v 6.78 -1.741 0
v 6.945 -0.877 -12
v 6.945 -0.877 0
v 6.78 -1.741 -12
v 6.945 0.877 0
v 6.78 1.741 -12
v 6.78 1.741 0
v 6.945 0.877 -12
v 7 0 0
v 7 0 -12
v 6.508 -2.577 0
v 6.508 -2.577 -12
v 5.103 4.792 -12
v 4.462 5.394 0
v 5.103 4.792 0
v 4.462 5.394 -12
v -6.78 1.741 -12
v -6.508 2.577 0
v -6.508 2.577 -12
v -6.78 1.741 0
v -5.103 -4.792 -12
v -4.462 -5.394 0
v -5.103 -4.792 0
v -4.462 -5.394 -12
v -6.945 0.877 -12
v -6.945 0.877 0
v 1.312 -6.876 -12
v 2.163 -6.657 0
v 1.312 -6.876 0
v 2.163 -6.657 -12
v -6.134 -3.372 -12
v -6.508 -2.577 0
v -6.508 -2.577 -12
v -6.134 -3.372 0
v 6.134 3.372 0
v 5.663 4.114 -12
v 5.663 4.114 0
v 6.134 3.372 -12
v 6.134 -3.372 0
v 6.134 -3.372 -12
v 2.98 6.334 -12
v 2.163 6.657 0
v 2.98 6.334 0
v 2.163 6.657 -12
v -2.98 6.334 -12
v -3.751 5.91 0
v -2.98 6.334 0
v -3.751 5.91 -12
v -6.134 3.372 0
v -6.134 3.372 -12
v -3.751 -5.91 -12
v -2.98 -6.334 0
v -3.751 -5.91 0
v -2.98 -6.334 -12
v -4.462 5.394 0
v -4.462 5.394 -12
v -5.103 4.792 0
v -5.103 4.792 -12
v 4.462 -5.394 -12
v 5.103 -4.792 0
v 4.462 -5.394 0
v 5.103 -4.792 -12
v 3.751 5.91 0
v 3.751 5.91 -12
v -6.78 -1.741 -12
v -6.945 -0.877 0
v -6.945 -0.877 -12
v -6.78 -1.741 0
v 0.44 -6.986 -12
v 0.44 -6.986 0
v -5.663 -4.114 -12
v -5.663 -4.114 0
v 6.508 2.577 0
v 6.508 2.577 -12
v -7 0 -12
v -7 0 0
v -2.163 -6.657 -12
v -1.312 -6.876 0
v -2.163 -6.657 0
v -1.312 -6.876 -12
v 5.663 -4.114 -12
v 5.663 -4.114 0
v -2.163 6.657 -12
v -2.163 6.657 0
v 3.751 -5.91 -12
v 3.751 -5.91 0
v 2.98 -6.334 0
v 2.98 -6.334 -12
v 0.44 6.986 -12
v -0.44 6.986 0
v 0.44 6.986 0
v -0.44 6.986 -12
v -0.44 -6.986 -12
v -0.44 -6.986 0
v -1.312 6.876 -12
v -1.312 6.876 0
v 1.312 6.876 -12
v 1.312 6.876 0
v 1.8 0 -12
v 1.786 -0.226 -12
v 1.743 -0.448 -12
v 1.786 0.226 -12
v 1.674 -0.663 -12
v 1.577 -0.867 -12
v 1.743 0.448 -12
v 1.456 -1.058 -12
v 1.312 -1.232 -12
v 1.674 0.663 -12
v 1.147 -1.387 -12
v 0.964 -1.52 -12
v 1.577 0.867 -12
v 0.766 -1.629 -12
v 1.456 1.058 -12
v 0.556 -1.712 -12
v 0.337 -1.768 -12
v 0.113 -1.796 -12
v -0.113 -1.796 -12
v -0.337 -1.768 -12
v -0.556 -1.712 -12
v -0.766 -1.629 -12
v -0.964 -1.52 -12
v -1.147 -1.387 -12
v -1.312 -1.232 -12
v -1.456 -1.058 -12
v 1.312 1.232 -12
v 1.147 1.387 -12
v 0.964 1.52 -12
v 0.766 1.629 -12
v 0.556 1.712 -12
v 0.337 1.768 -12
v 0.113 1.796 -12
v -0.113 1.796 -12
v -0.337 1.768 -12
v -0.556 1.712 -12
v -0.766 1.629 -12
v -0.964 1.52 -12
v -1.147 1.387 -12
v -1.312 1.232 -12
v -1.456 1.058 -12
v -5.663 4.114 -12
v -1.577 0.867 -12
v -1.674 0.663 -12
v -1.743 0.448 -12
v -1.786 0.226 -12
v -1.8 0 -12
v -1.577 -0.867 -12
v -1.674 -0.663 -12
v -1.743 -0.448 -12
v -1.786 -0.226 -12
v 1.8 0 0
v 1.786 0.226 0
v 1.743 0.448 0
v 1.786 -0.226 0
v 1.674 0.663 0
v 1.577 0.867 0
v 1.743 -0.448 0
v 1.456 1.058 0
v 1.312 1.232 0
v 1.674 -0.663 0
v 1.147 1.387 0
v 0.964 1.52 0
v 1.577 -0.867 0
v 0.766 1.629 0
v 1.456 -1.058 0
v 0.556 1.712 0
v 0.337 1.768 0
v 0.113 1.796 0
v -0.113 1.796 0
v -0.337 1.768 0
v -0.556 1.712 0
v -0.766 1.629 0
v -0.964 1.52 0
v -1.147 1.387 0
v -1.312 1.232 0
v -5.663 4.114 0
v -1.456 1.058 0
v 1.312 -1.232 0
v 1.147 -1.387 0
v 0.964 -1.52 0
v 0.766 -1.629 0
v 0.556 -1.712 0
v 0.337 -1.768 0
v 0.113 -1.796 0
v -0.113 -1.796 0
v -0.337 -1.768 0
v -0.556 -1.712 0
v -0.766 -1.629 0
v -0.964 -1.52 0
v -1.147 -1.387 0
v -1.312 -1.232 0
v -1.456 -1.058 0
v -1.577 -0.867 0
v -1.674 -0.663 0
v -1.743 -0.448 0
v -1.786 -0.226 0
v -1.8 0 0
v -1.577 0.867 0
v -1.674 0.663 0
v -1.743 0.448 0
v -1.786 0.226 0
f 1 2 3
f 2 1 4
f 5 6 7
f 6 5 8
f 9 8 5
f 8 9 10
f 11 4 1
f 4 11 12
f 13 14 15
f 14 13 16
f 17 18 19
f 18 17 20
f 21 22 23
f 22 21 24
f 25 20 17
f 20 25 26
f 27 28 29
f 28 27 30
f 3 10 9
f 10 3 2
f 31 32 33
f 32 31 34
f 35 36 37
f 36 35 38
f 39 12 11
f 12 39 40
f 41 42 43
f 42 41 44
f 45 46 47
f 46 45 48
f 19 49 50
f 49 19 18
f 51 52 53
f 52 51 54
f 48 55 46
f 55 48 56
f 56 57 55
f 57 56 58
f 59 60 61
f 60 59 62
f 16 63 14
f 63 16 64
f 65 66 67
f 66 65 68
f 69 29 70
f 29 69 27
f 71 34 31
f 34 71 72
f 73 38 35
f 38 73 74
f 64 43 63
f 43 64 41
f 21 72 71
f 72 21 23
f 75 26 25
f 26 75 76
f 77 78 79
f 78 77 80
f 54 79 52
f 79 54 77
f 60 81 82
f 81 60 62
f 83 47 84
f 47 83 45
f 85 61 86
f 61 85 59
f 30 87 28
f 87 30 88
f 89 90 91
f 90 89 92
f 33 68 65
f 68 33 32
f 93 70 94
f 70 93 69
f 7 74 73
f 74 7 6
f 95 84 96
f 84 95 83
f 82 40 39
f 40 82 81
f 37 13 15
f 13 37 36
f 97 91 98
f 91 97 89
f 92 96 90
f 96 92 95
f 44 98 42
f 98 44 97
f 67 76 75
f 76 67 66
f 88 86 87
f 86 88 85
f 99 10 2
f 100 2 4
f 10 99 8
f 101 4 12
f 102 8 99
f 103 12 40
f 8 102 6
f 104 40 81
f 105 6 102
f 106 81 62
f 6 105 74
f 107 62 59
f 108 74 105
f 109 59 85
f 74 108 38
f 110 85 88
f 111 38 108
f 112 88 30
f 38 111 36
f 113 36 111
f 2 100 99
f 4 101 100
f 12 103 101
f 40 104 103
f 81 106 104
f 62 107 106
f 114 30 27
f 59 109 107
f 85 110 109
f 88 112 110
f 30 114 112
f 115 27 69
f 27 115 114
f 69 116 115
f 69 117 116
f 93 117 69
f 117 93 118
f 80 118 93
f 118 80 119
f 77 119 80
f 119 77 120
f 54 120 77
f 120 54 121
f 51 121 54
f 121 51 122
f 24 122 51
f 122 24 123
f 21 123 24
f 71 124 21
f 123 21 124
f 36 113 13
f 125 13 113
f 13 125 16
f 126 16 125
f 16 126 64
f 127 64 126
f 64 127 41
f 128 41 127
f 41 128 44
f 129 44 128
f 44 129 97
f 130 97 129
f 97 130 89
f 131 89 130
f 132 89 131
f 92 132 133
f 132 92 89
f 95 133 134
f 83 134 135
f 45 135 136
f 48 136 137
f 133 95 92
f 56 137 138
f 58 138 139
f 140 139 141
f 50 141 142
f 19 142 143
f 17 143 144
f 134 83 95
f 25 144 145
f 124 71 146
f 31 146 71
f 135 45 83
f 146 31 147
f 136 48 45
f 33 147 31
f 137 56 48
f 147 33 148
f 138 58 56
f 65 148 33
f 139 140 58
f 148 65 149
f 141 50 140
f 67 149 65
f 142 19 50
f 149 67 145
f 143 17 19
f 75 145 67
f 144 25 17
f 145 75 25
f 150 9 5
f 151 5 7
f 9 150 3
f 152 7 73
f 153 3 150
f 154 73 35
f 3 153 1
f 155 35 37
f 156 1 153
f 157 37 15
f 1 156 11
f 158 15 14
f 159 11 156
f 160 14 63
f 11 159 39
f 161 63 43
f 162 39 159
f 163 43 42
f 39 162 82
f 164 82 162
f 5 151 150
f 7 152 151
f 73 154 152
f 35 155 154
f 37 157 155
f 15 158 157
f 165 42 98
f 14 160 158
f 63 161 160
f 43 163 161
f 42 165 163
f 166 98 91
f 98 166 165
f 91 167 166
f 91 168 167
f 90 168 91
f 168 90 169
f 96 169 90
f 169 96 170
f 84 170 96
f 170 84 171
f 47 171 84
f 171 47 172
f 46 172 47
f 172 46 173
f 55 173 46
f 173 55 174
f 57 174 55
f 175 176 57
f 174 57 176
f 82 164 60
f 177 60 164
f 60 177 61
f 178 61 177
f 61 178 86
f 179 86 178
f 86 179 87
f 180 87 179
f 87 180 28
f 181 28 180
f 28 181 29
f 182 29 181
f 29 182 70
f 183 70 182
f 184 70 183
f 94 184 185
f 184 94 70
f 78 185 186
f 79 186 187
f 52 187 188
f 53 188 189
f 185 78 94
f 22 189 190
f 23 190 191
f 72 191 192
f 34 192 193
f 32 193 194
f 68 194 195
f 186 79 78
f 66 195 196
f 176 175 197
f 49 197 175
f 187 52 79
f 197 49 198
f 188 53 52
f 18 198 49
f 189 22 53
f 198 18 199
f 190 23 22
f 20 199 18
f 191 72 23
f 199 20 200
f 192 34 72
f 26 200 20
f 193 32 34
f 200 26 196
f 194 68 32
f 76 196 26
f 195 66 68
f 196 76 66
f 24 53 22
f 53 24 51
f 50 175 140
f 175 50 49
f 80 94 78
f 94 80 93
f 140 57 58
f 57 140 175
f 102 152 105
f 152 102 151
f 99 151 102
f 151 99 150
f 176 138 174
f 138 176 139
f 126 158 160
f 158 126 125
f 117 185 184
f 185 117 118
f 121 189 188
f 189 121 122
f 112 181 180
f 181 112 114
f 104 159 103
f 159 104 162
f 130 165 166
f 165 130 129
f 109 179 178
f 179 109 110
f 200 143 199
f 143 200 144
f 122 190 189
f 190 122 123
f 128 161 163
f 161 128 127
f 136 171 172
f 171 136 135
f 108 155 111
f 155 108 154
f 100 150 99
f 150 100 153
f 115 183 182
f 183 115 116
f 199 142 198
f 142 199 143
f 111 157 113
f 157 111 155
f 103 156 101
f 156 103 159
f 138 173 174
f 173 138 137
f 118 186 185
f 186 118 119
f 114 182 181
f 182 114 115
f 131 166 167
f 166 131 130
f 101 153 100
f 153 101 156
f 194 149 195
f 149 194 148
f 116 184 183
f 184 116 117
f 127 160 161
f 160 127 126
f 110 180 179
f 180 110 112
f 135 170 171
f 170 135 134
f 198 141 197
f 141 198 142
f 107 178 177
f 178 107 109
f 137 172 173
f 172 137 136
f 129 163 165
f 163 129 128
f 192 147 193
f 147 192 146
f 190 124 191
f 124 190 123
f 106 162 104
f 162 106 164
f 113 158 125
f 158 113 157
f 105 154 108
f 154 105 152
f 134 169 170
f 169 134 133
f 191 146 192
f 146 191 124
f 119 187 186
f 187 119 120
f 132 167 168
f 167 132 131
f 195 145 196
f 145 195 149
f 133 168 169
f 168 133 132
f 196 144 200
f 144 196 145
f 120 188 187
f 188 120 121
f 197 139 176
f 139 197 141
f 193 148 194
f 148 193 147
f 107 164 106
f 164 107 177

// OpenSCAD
$fn = 50;


difference() {
	union() {
		translate(v = [0, 0, -12.0000000000]) {
			cylinder(h = 12, r = 7.0000000000);
		}
	}
	union() {
		#translate(v = [0, 0, -12]) {
			cylinder(h = 12, r = 1.8000000000);
		}
	}
}
